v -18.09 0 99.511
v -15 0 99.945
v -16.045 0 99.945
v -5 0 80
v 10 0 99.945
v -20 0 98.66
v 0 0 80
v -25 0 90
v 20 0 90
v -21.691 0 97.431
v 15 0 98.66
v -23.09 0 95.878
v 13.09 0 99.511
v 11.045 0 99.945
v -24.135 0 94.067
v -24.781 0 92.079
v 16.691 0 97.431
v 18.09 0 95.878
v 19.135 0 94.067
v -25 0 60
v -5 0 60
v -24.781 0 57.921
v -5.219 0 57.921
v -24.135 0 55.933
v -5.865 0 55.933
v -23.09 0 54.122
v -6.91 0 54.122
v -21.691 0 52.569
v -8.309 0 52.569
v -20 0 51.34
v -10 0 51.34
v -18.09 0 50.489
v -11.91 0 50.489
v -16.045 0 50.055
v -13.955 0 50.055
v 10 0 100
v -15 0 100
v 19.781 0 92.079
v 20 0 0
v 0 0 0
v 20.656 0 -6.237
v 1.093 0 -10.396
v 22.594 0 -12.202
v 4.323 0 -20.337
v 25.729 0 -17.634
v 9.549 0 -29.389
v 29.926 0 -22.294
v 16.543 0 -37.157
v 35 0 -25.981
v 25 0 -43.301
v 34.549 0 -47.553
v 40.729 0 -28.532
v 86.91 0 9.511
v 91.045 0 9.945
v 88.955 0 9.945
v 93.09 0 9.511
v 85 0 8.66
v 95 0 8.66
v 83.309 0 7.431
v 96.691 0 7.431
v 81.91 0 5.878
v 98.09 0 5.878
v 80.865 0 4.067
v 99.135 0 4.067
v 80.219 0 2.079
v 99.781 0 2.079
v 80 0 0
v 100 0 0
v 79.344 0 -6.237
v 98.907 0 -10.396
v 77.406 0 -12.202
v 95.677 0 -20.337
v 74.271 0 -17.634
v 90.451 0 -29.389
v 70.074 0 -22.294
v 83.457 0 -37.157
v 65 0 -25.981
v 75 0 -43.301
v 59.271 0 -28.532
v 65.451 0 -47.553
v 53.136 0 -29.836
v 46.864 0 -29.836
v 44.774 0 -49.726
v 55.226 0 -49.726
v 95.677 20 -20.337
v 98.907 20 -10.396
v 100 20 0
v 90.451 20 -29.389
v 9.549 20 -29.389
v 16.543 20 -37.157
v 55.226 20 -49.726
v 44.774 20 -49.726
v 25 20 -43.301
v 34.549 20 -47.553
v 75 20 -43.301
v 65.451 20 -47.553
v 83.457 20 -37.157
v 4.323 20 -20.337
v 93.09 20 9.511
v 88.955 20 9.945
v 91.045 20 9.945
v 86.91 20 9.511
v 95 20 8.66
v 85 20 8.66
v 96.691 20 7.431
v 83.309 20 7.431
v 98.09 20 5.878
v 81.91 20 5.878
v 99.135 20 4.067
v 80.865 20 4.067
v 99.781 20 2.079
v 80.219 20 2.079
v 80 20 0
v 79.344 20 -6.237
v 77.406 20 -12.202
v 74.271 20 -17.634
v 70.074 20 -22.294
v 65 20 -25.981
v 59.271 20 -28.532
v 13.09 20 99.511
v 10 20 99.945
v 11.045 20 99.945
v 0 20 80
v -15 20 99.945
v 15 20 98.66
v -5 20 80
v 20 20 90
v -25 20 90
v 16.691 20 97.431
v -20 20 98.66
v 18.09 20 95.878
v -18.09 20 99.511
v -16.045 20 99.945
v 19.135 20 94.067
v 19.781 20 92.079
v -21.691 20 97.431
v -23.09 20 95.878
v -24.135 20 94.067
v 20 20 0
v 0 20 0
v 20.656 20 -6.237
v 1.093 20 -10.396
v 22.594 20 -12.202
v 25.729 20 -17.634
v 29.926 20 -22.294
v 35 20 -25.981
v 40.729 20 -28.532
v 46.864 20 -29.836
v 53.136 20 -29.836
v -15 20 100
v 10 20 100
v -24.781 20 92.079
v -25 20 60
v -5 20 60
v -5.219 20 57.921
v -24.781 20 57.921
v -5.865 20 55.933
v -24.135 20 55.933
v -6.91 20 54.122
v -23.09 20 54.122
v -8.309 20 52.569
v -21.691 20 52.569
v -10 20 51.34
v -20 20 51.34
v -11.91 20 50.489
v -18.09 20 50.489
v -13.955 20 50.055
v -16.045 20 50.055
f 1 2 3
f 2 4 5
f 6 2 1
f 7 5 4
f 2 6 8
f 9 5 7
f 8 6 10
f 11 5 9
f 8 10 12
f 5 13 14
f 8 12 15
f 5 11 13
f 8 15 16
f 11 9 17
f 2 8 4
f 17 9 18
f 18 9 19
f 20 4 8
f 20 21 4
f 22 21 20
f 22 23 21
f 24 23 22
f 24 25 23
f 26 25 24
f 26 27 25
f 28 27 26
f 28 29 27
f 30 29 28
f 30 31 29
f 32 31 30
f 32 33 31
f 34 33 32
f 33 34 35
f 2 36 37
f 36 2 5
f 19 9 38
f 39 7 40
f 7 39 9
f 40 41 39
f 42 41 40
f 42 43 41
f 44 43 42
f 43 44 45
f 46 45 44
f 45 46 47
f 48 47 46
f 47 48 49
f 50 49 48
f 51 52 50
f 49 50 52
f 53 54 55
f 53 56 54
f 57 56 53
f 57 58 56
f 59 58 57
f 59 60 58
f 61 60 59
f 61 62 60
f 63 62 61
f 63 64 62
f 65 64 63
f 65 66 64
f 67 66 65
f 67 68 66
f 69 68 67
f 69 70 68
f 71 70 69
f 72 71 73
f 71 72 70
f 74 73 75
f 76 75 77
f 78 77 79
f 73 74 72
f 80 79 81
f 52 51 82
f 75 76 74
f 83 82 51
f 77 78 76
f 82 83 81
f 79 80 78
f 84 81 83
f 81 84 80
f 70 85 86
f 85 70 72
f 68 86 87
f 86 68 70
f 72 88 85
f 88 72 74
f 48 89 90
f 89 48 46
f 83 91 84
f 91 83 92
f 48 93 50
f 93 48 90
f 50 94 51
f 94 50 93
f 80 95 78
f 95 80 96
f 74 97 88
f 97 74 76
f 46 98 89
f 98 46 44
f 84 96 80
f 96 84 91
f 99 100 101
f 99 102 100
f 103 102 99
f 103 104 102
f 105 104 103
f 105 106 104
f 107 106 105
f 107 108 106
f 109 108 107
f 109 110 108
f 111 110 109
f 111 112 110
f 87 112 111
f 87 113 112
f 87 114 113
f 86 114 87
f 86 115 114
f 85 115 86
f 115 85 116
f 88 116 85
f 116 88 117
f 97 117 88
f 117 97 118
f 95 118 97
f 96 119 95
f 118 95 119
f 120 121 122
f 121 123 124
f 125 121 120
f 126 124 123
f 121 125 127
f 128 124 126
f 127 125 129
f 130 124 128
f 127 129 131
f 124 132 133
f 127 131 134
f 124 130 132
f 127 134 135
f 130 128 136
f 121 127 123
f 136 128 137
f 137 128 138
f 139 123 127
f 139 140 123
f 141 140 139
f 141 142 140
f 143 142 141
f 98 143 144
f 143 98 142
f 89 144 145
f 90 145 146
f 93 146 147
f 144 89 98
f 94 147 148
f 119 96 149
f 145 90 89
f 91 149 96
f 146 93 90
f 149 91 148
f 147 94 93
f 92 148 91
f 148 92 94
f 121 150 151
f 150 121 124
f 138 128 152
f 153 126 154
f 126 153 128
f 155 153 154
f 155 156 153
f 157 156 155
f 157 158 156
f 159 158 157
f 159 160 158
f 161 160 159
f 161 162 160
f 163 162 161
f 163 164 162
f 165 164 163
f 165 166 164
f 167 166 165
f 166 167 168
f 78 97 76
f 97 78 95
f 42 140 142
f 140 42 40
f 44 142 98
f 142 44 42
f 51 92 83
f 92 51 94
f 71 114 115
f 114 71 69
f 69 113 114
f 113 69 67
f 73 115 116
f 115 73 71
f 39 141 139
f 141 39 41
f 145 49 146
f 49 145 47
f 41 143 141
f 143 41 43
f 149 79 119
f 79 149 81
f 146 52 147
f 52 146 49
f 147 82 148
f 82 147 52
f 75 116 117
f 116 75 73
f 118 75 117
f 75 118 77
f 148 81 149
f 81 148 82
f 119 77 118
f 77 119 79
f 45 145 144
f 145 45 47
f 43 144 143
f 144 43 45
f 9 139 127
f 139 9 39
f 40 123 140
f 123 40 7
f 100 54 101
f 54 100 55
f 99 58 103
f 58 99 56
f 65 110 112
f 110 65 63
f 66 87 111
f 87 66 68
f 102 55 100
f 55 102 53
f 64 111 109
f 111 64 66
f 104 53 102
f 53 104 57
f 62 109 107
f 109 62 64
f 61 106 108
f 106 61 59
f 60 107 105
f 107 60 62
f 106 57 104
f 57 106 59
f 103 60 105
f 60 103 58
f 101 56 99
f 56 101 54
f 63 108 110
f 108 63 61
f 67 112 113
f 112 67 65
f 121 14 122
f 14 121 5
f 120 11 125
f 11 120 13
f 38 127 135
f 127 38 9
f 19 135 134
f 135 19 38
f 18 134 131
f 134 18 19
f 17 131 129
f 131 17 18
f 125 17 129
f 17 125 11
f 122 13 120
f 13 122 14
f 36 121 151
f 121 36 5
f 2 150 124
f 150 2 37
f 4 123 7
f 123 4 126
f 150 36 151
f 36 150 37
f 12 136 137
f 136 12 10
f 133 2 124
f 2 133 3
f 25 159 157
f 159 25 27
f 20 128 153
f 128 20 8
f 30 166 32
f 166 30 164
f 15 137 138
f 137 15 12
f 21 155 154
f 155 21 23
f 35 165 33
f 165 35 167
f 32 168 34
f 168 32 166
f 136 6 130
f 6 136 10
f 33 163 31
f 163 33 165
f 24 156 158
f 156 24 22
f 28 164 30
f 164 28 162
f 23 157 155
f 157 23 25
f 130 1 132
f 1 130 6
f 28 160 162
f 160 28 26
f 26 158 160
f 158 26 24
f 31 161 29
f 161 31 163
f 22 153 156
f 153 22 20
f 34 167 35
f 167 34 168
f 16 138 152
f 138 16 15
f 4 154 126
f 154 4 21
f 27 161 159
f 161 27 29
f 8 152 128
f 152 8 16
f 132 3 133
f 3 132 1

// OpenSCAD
// file: hook.scad
use <lib.scad>

module hook(height, width, hook) {
    union() {
        cube([width, width, height]);

        difference() {
            translate([hook, 0, 0])
            rotate([-90, 0, 0])
            bettercylinder(width, hook);

            translate([0, -1, 0])
            cube([hook*2, width+2, hook]);

            translate([hook, -1, 0])
            rotate([-90, 0, 0])
            bettercylinder(width+2, hook - width);
        }

        translate([hook*2 - width/2, 0, 0])
        rotate([-90, 0, 0])
        bettercylinder(width, width/2);
    }
}

hook(100, 20, 50);
// file: lib.scad
module bettersphere(r) {
   sphere(r, $fs=0.25);
}

module bettercylinder(h, r) {
   cylinder(h=h, r=r, $fs=0.25);
}

module roundedcube(dims, rounding, only_sides=false) {
    if (only_sides) {
        translate([rounding, rounding, 0]) {
            minkowski() {
                bettercylinder(1, rounding);
                cube(dims - [2*rounding, 2*rounding, 1]);
            }
        }
    } else {
        translate([rounding, rounding, rounding]) {
            minkowski() {
                cube(dims - [2*rounding, 2*rounding, 2*rounding]);
                bettersphere(rounding);
            }
        }
    }
}

//roundedcube([20, 50, 30], 3, only_sides=false);

module roundedcylinder(h, r, rounding) {
    translate([0, 0, rounding]) {
        minkowski()  {
            cylinder(h = h - 2*rounding, r = r - rounding);
            bettersphere(rounding);
        }
    }
}

//roundedcylinder(50, 20, 5);
// main file
use <lib.scad>
use <hook.scad>

module hook_panel_mount(height, width, hook, panel_thickness) {
    hook(height-width/2, width, hook);

    translate([width/2, 0, height - width/2])
    rotate([-90, 0, 0])
    bettercylinder(width, width/2);

    translate([-panel_thickness - width/2, 0, height])
    rotate([-90, 0, 0])
    cube([panel_thickness + width, width, width]);

    hull() {
        for (offset = [0.5*width, 2*width]) {
            translate([-panel_thickness - width/2, 0, height - offset])
            rotate([-90, 0, 0])
            bettercylinder(width, width/2);
        }
    }
}

hook_panel_mount(100, 20, 50, 5);
